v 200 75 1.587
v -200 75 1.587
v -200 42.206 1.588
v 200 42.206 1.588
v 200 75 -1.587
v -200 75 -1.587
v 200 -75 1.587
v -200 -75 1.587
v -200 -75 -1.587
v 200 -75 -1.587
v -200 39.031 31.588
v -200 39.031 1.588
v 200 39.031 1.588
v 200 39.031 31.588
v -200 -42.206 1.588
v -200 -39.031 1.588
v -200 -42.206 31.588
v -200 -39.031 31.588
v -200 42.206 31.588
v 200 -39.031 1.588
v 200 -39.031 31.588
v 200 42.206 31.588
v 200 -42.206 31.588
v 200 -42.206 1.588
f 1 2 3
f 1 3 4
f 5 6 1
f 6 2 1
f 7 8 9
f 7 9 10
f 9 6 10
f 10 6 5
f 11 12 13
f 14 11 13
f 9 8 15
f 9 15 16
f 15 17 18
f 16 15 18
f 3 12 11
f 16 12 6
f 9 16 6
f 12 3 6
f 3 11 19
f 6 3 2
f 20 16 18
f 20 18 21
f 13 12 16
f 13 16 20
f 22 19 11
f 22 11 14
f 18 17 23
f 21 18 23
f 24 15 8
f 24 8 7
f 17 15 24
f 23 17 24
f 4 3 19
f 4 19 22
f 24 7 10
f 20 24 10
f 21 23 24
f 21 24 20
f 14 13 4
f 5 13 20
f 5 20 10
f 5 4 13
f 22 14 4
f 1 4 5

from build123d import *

# Parameters (mm, degrees)
F0_W     = 400
F0_H     = 150
F1_DEPTH = 1.5875
F2_W     = 400
F2_H     = 3.175
F3_DEPTH = 30


with BuildPart() as f1:
    # F0 (on Top) → F1 (new body, symmetric)
    with BuildSketch(Plane.XY):
        Rectangle(F0_W, F0_H)
    extrude(amount=F1_DEPTH, both=True)

    # F2 (on face) → F3 (join)
    with BuildSketch(Plane.XY.offset(1.5875)):
        with Locations((0, 40.618111515)):
            Rectangle(F2_W, F2_H)
    extrude(amount=F3_DEPTH)

    # F4: F1 across plane


with BuildPart() as f1_1:
    add(f1.part)
    add(f1.part.mirror(Plane.XZ))


solid = f1_1.part
